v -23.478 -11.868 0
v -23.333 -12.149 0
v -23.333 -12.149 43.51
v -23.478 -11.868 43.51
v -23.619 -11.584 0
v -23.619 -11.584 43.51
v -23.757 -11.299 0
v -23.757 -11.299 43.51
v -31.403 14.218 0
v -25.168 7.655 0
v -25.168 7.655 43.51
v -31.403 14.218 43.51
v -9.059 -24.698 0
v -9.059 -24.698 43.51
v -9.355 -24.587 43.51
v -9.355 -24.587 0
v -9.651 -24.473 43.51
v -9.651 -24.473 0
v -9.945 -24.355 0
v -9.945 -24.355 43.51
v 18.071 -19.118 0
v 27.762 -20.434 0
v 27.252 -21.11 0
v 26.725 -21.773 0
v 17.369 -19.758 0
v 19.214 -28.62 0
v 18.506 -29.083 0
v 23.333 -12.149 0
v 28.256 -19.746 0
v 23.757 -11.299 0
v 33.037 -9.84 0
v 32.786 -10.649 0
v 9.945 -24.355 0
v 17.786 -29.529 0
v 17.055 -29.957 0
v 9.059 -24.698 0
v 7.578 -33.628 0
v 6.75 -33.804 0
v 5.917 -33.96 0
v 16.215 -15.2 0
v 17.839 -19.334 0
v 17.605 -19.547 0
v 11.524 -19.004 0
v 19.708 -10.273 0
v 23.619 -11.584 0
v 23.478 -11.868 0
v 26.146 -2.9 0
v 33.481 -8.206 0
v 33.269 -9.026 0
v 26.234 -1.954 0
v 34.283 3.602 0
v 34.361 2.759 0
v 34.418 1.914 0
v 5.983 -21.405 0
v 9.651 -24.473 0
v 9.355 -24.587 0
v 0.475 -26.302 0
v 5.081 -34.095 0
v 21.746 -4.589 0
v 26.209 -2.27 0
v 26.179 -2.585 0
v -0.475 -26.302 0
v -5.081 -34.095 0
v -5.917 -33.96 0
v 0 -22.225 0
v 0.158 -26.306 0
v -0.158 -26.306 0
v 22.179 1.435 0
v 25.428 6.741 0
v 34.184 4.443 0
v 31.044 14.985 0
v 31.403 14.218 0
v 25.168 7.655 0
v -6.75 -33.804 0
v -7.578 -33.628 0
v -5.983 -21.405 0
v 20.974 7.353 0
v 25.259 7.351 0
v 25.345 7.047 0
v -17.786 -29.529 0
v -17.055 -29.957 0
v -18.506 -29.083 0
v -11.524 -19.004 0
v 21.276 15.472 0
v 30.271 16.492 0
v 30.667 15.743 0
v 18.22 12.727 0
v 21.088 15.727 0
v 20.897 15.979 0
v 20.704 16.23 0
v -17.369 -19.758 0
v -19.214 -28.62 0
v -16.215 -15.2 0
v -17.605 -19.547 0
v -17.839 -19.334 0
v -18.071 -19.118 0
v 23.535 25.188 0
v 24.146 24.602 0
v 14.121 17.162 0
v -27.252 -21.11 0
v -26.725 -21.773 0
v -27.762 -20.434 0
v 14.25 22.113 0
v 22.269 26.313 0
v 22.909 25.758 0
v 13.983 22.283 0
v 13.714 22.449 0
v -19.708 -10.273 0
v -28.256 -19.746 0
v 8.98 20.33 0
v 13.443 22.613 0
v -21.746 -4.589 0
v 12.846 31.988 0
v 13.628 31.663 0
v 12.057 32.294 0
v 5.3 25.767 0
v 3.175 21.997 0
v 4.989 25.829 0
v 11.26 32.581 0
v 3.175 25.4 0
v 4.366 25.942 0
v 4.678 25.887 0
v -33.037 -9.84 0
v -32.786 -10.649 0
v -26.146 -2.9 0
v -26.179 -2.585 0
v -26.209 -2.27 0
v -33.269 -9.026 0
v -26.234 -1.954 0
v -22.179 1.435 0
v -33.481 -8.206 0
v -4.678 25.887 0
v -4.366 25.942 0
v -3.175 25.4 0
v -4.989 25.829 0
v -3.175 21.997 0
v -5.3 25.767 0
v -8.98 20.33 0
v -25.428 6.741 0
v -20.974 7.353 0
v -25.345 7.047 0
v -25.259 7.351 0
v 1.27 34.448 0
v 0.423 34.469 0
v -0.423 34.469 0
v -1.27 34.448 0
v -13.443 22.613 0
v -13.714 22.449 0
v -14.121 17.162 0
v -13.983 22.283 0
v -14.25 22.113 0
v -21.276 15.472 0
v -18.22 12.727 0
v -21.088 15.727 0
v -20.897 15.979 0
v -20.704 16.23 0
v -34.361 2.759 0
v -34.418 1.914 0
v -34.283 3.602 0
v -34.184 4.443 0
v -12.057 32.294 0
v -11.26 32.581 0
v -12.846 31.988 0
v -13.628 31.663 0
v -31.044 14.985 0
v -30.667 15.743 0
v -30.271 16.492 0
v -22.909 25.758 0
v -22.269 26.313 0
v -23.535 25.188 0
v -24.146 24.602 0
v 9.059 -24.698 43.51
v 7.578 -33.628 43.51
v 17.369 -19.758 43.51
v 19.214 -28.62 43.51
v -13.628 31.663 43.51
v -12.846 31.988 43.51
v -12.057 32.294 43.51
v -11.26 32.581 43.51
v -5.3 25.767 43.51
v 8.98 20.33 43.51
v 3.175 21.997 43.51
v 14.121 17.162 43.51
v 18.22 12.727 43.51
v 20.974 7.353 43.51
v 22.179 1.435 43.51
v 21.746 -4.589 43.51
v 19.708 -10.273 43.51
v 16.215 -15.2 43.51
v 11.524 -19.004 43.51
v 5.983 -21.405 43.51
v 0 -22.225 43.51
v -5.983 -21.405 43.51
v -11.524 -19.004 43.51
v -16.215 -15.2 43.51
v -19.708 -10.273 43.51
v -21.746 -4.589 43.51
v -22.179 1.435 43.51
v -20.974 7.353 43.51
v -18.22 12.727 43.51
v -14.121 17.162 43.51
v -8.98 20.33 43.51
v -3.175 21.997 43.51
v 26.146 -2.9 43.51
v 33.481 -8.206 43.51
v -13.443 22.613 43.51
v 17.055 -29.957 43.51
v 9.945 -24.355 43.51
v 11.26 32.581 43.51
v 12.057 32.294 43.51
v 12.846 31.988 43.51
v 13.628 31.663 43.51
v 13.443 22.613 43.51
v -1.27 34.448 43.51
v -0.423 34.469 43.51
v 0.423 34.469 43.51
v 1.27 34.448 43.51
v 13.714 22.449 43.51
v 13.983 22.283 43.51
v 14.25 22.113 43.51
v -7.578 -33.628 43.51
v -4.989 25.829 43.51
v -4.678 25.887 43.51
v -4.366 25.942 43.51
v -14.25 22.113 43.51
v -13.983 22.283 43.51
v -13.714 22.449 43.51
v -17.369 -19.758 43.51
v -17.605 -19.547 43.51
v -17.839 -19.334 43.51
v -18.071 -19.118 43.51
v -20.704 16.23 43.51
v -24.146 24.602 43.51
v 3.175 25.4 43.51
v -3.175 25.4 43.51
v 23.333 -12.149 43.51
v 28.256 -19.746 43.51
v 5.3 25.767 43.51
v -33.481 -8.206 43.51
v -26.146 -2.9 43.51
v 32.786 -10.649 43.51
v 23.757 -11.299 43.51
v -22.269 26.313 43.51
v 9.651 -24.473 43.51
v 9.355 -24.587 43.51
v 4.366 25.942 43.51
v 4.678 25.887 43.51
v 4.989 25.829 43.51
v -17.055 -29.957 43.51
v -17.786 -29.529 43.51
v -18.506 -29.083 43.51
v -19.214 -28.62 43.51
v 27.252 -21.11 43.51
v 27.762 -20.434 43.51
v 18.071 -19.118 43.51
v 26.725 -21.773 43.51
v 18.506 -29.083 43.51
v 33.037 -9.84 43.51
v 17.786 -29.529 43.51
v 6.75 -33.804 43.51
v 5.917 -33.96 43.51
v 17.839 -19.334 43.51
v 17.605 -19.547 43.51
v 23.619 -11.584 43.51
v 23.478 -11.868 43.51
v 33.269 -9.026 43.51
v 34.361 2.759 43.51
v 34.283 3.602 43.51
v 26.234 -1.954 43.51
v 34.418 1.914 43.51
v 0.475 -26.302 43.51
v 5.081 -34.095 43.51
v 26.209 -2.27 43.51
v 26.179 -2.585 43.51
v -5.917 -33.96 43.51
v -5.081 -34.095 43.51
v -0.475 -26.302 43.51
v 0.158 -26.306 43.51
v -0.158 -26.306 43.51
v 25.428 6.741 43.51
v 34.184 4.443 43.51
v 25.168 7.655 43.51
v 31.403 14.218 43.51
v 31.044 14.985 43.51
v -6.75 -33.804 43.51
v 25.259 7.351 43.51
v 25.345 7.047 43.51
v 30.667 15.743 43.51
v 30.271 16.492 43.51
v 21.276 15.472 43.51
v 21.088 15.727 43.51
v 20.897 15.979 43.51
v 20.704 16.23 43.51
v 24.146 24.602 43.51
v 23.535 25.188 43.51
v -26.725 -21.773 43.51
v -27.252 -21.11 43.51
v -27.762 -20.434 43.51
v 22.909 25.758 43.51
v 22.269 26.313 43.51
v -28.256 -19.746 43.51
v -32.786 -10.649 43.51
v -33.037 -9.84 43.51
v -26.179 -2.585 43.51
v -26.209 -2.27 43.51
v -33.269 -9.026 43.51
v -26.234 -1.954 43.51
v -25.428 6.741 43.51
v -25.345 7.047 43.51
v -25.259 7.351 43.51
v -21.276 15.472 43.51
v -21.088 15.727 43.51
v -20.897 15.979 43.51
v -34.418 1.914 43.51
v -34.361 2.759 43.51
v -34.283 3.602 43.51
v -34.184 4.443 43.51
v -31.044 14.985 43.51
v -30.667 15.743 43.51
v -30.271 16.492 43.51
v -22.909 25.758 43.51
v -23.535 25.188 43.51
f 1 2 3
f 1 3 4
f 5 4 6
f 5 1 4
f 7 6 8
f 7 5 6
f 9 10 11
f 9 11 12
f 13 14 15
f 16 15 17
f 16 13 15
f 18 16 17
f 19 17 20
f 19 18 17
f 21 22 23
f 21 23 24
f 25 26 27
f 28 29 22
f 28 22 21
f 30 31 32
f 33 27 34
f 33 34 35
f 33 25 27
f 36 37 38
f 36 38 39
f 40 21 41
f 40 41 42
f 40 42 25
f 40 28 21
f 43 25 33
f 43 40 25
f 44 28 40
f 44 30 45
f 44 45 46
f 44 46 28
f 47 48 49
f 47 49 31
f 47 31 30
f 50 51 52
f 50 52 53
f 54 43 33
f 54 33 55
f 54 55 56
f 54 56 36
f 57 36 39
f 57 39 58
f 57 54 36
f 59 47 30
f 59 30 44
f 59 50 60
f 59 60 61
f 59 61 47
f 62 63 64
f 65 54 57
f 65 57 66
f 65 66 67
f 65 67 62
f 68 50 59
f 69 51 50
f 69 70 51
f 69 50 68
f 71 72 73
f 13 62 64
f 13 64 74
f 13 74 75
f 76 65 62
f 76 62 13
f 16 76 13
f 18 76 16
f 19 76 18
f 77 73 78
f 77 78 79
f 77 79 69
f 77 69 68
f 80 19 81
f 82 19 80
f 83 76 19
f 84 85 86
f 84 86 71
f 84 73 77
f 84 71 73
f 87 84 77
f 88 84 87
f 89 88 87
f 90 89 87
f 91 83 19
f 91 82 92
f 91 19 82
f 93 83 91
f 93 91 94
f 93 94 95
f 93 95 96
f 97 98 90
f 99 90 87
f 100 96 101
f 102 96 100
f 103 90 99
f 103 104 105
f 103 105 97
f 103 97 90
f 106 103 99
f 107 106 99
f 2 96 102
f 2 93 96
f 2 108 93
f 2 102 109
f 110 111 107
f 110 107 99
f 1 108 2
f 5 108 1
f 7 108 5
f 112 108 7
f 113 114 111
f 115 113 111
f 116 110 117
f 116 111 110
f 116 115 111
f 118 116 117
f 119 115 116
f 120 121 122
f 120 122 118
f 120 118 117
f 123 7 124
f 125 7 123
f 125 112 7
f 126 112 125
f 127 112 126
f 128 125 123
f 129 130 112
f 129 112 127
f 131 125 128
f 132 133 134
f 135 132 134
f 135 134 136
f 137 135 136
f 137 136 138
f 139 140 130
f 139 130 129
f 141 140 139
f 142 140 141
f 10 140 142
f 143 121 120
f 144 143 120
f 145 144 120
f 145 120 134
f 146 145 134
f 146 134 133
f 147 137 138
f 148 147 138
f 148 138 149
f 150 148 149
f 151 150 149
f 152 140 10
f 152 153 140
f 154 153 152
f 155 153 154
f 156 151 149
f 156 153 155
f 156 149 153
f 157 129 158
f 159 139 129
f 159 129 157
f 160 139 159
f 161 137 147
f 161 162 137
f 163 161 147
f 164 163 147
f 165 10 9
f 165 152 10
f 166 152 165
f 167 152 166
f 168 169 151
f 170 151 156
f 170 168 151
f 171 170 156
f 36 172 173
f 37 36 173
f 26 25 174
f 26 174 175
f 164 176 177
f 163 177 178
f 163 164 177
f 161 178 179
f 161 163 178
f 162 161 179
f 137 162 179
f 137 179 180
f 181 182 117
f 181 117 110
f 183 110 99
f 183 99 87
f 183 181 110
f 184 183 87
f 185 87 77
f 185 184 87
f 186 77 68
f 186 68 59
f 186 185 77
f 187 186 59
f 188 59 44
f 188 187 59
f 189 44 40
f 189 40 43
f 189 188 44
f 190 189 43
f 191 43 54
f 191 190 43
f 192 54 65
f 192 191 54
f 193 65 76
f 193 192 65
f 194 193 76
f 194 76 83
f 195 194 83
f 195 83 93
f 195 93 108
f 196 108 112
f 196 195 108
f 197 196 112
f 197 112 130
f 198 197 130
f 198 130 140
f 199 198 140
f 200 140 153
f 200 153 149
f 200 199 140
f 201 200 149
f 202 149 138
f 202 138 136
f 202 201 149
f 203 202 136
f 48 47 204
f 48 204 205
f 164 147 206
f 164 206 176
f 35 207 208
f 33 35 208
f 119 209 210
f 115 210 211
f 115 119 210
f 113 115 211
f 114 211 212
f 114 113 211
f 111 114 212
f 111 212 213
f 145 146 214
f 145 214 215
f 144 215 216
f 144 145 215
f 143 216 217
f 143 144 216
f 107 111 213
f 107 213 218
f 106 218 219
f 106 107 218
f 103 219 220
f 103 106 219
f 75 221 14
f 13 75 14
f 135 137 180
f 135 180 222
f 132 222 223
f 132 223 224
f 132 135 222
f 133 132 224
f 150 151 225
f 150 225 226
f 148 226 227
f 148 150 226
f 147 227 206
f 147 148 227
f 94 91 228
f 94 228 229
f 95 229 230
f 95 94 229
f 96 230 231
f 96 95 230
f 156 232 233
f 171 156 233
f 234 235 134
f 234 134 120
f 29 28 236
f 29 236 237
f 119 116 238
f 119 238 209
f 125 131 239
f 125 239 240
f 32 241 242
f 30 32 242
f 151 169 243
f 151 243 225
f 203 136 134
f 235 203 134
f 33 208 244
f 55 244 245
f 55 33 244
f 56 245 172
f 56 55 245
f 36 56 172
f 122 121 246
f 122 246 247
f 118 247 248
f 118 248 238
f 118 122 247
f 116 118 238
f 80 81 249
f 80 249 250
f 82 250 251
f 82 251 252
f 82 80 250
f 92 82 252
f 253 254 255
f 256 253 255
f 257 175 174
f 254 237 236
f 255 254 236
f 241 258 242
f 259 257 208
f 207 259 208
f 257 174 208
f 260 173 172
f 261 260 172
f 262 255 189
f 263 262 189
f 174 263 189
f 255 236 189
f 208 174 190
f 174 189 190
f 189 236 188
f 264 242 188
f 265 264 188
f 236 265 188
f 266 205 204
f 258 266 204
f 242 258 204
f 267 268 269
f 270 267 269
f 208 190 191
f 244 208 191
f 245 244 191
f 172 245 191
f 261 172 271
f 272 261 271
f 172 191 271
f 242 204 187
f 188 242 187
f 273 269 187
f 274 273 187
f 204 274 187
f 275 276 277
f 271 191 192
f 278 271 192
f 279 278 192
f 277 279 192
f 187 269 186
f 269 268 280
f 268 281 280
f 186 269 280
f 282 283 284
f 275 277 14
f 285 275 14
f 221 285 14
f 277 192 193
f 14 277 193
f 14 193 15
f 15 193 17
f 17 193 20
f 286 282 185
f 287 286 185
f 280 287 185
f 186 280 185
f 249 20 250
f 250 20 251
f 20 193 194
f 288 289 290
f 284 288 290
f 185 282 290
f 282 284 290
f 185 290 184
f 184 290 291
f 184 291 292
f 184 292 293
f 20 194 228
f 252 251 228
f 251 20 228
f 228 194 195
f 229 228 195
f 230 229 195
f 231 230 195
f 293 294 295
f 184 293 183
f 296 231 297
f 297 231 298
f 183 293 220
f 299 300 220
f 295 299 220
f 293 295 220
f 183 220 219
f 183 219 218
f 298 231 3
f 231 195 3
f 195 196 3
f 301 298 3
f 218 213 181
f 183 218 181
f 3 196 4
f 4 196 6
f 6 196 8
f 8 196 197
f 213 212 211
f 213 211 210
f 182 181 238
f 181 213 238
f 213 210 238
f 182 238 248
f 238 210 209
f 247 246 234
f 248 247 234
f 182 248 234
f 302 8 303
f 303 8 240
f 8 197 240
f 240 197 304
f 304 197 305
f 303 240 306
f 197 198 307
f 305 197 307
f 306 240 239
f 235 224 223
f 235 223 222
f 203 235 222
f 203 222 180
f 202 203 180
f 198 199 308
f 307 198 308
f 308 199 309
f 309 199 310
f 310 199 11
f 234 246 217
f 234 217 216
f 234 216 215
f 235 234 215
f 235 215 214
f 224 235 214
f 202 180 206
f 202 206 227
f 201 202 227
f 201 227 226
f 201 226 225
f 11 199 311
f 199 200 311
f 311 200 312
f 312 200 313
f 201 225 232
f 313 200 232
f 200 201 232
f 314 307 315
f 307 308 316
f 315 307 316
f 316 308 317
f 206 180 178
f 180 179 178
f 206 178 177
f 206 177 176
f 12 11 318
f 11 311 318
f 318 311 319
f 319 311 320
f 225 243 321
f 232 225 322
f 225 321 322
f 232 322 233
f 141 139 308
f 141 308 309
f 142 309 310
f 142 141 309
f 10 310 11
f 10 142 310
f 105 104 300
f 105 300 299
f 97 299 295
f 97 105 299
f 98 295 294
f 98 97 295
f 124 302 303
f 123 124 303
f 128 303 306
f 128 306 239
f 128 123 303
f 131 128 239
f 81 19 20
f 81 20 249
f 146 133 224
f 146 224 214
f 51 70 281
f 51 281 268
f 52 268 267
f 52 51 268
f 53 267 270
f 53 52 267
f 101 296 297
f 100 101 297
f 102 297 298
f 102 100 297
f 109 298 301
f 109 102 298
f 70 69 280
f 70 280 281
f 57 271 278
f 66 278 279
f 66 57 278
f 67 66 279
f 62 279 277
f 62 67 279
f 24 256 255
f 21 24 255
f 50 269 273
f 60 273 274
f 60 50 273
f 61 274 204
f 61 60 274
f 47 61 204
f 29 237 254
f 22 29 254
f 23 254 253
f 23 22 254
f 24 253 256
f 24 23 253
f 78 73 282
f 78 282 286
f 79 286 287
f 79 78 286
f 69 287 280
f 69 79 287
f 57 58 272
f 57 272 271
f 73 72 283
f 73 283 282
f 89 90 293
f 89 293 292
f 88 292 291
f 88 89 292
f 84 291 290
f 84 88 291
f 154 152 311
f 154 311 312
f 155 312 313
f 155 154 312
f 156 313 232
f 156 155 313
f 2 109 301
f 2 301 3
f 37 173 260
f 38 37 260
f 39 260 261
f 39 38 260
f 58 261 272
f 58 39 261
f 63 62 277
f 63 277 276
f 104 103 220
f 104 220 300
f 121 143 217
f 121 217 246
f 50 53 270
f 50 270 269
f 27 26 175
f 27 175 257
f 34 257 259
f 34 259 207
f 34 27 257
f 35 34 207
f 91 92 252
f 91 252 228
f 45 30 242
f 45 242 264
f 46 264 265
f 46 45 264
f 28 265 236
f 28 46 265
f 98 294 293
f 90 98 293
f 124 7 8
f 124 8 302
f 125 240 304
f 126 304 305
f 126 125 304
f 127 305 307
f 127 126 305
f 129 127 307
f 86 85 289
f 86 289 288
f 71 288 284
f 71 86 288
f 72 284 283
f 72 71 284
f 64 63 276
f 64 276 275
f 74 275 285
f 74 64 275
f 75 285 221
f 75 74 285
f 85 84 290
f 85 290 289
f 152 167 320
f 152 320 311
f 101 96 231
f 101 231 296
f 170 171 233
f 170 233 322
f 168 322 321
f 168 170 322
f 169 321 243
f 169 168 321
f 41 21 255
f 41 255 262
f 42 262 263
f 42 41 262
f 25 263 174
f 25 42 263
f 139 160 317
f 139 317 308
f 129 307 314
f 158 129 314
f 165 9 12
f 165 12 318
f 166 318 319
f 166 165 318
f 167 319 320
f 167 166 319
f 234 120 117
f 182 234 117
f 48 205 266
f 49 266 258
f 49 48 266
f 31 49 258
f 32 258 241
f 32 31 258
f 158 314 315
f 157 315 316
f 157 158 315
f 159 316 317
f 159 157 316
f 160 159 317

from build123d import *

# Parameters (mm, degrees)
BOSS_EXTRUDE1_DEPTH = 43.5102
CUT_EXTRUDE1_DEPTH  = 43.5102


with BuildPart() as part:
    # Sketch2 → Boss-Extrude1 (new body)
    with BuildSketch(Plane.XY):
        with BuildLine():
            Line((-4.366026501, 25.941944541), (-1.27, 34.448207442))
            ThreePointArc((-1.27, 34.448207442), (0, 34.47161), (1.27, 34.448207442))
            Line((1.27, 34.448207442), (4.366026501, 25.941944541))
            ThreePointArc((4.366026501, 25.941944541), (4.83385814, 25.858857079), (5.300112805, 25.767333549))
            Line((5.300112805, 25.767333549), (11.259888122, 32.580773709))
            ThreePointArc((11.259888122, 32.580773709), (12.452581833, 32.143819028), (13.628367585, 31.663219877))
            Line((13.628367585, 31.663219877), (13.442509735, 22.612952173))
            ThreePointArc((13.442509735, 22.612952173), (13.848735094, 22.366475142), (14.250442508, 22.11270138))
            Line((14.250442508, 22.11270138), (22.26906596, 26.31312595))
            ThreePointArc((22.26906596, 26.31312595), (23.223373486, 25.474827181), (24.14614861, 24.601939015))
            Line((24.14614861, 24.601939015), (20.703507542, 16.229955312))
            ThreePointArc((20.703507542, 16.229955312), (20.993263634, 15.8533768), (21.276170986, 15.471626358))
            Line((21.276170986, 15.471626358), (30.270683044, 16.491744725))
            ThreePointArc((30.270683044, 16.491744725), (30.857719866, 15.365318762), (31.402858467, 14.218029965))
            Line((31.402858467, 14.218029965), (25.168381933, 7.655013053))
            ThreePointArc((25.168381933, 7.655013053), (25.302535593, 7.199192074), (25.428434676, 6.741022466))
            Line((25.428434676, 6.741022466), (34.184076646, 4.443061991))
            ThreePointArc((34.184076646, 4.443061991), (34.324560189, 3.180638903), (34.418438279, 1.913897183))
            Line((34.418438279, 1.913897183), (26.234126882, -1.953781138))
            ThreePointArc((26.234126882, -1.953781138), (26.194559914, -2.427283433), (26.14644736, -2.899993864))
            Line((26.14644736, -2.899993864), (33.480721277, -8.205680884))
            ThreePointArc((33.480721277, -8.205680884), (33.155678459, -9.433603865), (32.785617282, -10.648718018))
            Line((32.785617282, -10.648718018), (23.756807626, -11.298706359))
            ThreePointArc((23.756807626, -11.298706359), (23.54886377, -11.725940863), (23.333237446, -12.149349953))
            Line((23.333237446, -12.149349953), (28.255608976, -19.746201087))
            ThreePointArc((28.255608976, -19.746201087), (27.508938632, -20.773786158), (26.724917, -21.773164845))
            Line((26.724917, -21.773164845), (18.07099986, -19.117678678))
            ThreePointArc((18.07099986, -19.117678678), (17.722763084, -19.440945003), (17.36874452, -19.757869009))
            Line((17.36874452, -19.757869009), (19.214420114, -28.619887416))
            ThreePointArc((19.214420114, -28.619887416), (18.14696421, -29.308353518), (17.054868589, -29.95702511))
            Line((17.054868589, -29.95702511), (9.944603428, -24.354702557))
            ThreePointArc((9.944603428, -24.354702557), (9.503105039, -24.530341795), (9.058506404, -24.697978373))
            Line((9.058506404, -24.697978373), (7.578217344, -33.628299361))
            ThreePointArc((7.578217344, -33.628299361), (6.334141716, -33.884665333), (5.081465671, -34.095023136))
            Line((5.081465671, -34.095023136), (0.475133198, -26.302488901))
            ThreePointArc((0.475133198, -26.302488901), (0, -26.30678), (-0.475133198, -26.302488901))
            Line((-0.475133198, -26.302488901), (-5.081465671, -34.095023136))
            ThreePointArc((-5.081465671, -34.095023136), (-6.334141716, -33.884665333), (-7.578217344, -33.628299361))
            Line((-7.578217344, -33.628299361), (-9.058506404, -24.697978373))
            ThreePointArc((-9.058506404, -24.697978373), (-9.503105039, -24.530341795), (-9.944603428, -24.354702557))
            Line((-9.944603428, -24.354702557), (-17.054868589, -29.95702511))
            ThreePointArc((-17.054868589, -29.95702511), (-18.14696421, -29.308353518), (-19.214420114, -28.619887416))
            Line((-19.214420114, -28.619887416), (-17.36874452, -19.757869009))
            ThreePointArc((-17.36874452, -19.757869009), (-17.722763084, -19.440945003), (-18.07099986, -19.117678678))
            Line((-18.07099986, -19.117678678), (-26.724917, -21.773164845))
            ThreePointArc((-26.724917, -21.773164845), (-27.508938632, -20.773786158), (-28.255608976, -19.746201087))
            Line((-28.255608976, -19.746201087), (-23.333237446, -12.149349953))
            ThreePointArc((-23.333237446, -12.149349953), (-23.54886377, -11.725940863), (-23.756807626, -11.298706359))
            Line((-23.756807626, -11.298706359), (-32.785617282, -10.648718018))
            ThreePointArc((-32.785617282, -10.648718018), (-33.155678459, -9.433603865), (-33.480721277, -8.205680884))
            Line((-33.480721277, -8.205680884), (-26.14644736, -2.899993864))
            ThreePointArc((-26.14644736, -2.899993864), (-26.194559914, -2.427283433), (-26.234126882, -1.953781138))
            Line((-26.234126882, -1.953781138), (-34.418438279, 1.913897183))
            ThreePointArc((-34.418438279, 1.913897183), (-34.324560189, 3.180638903), (-34.184076646, 4.443061991))
            Line((-34.184076646, 4.443061991), (-25.428434676, 6.741022466))
            ThreePointArc((-25.428434676, 6.741022466), (-25.302535593, 7.199192074), (-25.168381933, 7.655013053))
            Line((-25.168381933, 7.655013053), (-31.402858467, 14.218029965))
            ThreePointArc((-31.402858467, 14.218029965), (-30.857719866, 15.365318762), (-30.270683044, 16.491744725))
            Line((-30.270683044, 16.491744725), (-21.276170986, 15.471626358))
            ThreePointArc((-21.276170986, 15.471626358), (-20.993263634, 15.8533768), (-20.703507542, 16.229955312))
            Line((-20.703507542, 16.229955312), (-24.14614861, 24.601939015))
            ThreePointArc((-24.14614861, 24.601939015), (-23.223373486, 25.474827181), (-22.26906596, 26.31312595))
            Line((-22.26906596, 26.31312595), (-14.250442508, 22.11270138))
            ThreePointArc((-14.250442508, 22.11270138), (-13.848735094, 22.366475142), (-13.442509735, 22.612952173))
            Line((-13.442509735, 22.612952173), (-13.628367585, 31.663219877))
            ThreePointArc((-13.628367585, 31.663219877), (-12.452581833, 32.143819028), (-11.259888122, 32.580773709))
            Line((-11.259888122, 32.580773709), (-5.300112805, 25.767333549))
            ThreePointArc((-5.300112805, 25.767333549), (-4.83385814, 25.858857079), (-4.366026501, 25.941944541))
        make_face()
    extrude(amount=BOSS_EXTRUDE1_DEPTH)

    # Sketch4 → Cut-Extrude1 (cut)
    with BuildSketch(Plane.XY.offset(43.5102)):
        with BuildLine():
            Line((-3.175, 25.4), (3.175, 25.4))
            Line((3.175, 25.4), (3.175, 21.997045256))
            ThreePointArc((3.175, 21.997045256), (0, -22.225), (-3.175, 21.997045256))
            Line((-3.175, 21.997045256), (-3.175, 25.4))
        make_face()
    extrude(amount=-CUT_EXTRUDE1_DEPTH, mode=Mode.SUBTRACT)


solid = part.part
